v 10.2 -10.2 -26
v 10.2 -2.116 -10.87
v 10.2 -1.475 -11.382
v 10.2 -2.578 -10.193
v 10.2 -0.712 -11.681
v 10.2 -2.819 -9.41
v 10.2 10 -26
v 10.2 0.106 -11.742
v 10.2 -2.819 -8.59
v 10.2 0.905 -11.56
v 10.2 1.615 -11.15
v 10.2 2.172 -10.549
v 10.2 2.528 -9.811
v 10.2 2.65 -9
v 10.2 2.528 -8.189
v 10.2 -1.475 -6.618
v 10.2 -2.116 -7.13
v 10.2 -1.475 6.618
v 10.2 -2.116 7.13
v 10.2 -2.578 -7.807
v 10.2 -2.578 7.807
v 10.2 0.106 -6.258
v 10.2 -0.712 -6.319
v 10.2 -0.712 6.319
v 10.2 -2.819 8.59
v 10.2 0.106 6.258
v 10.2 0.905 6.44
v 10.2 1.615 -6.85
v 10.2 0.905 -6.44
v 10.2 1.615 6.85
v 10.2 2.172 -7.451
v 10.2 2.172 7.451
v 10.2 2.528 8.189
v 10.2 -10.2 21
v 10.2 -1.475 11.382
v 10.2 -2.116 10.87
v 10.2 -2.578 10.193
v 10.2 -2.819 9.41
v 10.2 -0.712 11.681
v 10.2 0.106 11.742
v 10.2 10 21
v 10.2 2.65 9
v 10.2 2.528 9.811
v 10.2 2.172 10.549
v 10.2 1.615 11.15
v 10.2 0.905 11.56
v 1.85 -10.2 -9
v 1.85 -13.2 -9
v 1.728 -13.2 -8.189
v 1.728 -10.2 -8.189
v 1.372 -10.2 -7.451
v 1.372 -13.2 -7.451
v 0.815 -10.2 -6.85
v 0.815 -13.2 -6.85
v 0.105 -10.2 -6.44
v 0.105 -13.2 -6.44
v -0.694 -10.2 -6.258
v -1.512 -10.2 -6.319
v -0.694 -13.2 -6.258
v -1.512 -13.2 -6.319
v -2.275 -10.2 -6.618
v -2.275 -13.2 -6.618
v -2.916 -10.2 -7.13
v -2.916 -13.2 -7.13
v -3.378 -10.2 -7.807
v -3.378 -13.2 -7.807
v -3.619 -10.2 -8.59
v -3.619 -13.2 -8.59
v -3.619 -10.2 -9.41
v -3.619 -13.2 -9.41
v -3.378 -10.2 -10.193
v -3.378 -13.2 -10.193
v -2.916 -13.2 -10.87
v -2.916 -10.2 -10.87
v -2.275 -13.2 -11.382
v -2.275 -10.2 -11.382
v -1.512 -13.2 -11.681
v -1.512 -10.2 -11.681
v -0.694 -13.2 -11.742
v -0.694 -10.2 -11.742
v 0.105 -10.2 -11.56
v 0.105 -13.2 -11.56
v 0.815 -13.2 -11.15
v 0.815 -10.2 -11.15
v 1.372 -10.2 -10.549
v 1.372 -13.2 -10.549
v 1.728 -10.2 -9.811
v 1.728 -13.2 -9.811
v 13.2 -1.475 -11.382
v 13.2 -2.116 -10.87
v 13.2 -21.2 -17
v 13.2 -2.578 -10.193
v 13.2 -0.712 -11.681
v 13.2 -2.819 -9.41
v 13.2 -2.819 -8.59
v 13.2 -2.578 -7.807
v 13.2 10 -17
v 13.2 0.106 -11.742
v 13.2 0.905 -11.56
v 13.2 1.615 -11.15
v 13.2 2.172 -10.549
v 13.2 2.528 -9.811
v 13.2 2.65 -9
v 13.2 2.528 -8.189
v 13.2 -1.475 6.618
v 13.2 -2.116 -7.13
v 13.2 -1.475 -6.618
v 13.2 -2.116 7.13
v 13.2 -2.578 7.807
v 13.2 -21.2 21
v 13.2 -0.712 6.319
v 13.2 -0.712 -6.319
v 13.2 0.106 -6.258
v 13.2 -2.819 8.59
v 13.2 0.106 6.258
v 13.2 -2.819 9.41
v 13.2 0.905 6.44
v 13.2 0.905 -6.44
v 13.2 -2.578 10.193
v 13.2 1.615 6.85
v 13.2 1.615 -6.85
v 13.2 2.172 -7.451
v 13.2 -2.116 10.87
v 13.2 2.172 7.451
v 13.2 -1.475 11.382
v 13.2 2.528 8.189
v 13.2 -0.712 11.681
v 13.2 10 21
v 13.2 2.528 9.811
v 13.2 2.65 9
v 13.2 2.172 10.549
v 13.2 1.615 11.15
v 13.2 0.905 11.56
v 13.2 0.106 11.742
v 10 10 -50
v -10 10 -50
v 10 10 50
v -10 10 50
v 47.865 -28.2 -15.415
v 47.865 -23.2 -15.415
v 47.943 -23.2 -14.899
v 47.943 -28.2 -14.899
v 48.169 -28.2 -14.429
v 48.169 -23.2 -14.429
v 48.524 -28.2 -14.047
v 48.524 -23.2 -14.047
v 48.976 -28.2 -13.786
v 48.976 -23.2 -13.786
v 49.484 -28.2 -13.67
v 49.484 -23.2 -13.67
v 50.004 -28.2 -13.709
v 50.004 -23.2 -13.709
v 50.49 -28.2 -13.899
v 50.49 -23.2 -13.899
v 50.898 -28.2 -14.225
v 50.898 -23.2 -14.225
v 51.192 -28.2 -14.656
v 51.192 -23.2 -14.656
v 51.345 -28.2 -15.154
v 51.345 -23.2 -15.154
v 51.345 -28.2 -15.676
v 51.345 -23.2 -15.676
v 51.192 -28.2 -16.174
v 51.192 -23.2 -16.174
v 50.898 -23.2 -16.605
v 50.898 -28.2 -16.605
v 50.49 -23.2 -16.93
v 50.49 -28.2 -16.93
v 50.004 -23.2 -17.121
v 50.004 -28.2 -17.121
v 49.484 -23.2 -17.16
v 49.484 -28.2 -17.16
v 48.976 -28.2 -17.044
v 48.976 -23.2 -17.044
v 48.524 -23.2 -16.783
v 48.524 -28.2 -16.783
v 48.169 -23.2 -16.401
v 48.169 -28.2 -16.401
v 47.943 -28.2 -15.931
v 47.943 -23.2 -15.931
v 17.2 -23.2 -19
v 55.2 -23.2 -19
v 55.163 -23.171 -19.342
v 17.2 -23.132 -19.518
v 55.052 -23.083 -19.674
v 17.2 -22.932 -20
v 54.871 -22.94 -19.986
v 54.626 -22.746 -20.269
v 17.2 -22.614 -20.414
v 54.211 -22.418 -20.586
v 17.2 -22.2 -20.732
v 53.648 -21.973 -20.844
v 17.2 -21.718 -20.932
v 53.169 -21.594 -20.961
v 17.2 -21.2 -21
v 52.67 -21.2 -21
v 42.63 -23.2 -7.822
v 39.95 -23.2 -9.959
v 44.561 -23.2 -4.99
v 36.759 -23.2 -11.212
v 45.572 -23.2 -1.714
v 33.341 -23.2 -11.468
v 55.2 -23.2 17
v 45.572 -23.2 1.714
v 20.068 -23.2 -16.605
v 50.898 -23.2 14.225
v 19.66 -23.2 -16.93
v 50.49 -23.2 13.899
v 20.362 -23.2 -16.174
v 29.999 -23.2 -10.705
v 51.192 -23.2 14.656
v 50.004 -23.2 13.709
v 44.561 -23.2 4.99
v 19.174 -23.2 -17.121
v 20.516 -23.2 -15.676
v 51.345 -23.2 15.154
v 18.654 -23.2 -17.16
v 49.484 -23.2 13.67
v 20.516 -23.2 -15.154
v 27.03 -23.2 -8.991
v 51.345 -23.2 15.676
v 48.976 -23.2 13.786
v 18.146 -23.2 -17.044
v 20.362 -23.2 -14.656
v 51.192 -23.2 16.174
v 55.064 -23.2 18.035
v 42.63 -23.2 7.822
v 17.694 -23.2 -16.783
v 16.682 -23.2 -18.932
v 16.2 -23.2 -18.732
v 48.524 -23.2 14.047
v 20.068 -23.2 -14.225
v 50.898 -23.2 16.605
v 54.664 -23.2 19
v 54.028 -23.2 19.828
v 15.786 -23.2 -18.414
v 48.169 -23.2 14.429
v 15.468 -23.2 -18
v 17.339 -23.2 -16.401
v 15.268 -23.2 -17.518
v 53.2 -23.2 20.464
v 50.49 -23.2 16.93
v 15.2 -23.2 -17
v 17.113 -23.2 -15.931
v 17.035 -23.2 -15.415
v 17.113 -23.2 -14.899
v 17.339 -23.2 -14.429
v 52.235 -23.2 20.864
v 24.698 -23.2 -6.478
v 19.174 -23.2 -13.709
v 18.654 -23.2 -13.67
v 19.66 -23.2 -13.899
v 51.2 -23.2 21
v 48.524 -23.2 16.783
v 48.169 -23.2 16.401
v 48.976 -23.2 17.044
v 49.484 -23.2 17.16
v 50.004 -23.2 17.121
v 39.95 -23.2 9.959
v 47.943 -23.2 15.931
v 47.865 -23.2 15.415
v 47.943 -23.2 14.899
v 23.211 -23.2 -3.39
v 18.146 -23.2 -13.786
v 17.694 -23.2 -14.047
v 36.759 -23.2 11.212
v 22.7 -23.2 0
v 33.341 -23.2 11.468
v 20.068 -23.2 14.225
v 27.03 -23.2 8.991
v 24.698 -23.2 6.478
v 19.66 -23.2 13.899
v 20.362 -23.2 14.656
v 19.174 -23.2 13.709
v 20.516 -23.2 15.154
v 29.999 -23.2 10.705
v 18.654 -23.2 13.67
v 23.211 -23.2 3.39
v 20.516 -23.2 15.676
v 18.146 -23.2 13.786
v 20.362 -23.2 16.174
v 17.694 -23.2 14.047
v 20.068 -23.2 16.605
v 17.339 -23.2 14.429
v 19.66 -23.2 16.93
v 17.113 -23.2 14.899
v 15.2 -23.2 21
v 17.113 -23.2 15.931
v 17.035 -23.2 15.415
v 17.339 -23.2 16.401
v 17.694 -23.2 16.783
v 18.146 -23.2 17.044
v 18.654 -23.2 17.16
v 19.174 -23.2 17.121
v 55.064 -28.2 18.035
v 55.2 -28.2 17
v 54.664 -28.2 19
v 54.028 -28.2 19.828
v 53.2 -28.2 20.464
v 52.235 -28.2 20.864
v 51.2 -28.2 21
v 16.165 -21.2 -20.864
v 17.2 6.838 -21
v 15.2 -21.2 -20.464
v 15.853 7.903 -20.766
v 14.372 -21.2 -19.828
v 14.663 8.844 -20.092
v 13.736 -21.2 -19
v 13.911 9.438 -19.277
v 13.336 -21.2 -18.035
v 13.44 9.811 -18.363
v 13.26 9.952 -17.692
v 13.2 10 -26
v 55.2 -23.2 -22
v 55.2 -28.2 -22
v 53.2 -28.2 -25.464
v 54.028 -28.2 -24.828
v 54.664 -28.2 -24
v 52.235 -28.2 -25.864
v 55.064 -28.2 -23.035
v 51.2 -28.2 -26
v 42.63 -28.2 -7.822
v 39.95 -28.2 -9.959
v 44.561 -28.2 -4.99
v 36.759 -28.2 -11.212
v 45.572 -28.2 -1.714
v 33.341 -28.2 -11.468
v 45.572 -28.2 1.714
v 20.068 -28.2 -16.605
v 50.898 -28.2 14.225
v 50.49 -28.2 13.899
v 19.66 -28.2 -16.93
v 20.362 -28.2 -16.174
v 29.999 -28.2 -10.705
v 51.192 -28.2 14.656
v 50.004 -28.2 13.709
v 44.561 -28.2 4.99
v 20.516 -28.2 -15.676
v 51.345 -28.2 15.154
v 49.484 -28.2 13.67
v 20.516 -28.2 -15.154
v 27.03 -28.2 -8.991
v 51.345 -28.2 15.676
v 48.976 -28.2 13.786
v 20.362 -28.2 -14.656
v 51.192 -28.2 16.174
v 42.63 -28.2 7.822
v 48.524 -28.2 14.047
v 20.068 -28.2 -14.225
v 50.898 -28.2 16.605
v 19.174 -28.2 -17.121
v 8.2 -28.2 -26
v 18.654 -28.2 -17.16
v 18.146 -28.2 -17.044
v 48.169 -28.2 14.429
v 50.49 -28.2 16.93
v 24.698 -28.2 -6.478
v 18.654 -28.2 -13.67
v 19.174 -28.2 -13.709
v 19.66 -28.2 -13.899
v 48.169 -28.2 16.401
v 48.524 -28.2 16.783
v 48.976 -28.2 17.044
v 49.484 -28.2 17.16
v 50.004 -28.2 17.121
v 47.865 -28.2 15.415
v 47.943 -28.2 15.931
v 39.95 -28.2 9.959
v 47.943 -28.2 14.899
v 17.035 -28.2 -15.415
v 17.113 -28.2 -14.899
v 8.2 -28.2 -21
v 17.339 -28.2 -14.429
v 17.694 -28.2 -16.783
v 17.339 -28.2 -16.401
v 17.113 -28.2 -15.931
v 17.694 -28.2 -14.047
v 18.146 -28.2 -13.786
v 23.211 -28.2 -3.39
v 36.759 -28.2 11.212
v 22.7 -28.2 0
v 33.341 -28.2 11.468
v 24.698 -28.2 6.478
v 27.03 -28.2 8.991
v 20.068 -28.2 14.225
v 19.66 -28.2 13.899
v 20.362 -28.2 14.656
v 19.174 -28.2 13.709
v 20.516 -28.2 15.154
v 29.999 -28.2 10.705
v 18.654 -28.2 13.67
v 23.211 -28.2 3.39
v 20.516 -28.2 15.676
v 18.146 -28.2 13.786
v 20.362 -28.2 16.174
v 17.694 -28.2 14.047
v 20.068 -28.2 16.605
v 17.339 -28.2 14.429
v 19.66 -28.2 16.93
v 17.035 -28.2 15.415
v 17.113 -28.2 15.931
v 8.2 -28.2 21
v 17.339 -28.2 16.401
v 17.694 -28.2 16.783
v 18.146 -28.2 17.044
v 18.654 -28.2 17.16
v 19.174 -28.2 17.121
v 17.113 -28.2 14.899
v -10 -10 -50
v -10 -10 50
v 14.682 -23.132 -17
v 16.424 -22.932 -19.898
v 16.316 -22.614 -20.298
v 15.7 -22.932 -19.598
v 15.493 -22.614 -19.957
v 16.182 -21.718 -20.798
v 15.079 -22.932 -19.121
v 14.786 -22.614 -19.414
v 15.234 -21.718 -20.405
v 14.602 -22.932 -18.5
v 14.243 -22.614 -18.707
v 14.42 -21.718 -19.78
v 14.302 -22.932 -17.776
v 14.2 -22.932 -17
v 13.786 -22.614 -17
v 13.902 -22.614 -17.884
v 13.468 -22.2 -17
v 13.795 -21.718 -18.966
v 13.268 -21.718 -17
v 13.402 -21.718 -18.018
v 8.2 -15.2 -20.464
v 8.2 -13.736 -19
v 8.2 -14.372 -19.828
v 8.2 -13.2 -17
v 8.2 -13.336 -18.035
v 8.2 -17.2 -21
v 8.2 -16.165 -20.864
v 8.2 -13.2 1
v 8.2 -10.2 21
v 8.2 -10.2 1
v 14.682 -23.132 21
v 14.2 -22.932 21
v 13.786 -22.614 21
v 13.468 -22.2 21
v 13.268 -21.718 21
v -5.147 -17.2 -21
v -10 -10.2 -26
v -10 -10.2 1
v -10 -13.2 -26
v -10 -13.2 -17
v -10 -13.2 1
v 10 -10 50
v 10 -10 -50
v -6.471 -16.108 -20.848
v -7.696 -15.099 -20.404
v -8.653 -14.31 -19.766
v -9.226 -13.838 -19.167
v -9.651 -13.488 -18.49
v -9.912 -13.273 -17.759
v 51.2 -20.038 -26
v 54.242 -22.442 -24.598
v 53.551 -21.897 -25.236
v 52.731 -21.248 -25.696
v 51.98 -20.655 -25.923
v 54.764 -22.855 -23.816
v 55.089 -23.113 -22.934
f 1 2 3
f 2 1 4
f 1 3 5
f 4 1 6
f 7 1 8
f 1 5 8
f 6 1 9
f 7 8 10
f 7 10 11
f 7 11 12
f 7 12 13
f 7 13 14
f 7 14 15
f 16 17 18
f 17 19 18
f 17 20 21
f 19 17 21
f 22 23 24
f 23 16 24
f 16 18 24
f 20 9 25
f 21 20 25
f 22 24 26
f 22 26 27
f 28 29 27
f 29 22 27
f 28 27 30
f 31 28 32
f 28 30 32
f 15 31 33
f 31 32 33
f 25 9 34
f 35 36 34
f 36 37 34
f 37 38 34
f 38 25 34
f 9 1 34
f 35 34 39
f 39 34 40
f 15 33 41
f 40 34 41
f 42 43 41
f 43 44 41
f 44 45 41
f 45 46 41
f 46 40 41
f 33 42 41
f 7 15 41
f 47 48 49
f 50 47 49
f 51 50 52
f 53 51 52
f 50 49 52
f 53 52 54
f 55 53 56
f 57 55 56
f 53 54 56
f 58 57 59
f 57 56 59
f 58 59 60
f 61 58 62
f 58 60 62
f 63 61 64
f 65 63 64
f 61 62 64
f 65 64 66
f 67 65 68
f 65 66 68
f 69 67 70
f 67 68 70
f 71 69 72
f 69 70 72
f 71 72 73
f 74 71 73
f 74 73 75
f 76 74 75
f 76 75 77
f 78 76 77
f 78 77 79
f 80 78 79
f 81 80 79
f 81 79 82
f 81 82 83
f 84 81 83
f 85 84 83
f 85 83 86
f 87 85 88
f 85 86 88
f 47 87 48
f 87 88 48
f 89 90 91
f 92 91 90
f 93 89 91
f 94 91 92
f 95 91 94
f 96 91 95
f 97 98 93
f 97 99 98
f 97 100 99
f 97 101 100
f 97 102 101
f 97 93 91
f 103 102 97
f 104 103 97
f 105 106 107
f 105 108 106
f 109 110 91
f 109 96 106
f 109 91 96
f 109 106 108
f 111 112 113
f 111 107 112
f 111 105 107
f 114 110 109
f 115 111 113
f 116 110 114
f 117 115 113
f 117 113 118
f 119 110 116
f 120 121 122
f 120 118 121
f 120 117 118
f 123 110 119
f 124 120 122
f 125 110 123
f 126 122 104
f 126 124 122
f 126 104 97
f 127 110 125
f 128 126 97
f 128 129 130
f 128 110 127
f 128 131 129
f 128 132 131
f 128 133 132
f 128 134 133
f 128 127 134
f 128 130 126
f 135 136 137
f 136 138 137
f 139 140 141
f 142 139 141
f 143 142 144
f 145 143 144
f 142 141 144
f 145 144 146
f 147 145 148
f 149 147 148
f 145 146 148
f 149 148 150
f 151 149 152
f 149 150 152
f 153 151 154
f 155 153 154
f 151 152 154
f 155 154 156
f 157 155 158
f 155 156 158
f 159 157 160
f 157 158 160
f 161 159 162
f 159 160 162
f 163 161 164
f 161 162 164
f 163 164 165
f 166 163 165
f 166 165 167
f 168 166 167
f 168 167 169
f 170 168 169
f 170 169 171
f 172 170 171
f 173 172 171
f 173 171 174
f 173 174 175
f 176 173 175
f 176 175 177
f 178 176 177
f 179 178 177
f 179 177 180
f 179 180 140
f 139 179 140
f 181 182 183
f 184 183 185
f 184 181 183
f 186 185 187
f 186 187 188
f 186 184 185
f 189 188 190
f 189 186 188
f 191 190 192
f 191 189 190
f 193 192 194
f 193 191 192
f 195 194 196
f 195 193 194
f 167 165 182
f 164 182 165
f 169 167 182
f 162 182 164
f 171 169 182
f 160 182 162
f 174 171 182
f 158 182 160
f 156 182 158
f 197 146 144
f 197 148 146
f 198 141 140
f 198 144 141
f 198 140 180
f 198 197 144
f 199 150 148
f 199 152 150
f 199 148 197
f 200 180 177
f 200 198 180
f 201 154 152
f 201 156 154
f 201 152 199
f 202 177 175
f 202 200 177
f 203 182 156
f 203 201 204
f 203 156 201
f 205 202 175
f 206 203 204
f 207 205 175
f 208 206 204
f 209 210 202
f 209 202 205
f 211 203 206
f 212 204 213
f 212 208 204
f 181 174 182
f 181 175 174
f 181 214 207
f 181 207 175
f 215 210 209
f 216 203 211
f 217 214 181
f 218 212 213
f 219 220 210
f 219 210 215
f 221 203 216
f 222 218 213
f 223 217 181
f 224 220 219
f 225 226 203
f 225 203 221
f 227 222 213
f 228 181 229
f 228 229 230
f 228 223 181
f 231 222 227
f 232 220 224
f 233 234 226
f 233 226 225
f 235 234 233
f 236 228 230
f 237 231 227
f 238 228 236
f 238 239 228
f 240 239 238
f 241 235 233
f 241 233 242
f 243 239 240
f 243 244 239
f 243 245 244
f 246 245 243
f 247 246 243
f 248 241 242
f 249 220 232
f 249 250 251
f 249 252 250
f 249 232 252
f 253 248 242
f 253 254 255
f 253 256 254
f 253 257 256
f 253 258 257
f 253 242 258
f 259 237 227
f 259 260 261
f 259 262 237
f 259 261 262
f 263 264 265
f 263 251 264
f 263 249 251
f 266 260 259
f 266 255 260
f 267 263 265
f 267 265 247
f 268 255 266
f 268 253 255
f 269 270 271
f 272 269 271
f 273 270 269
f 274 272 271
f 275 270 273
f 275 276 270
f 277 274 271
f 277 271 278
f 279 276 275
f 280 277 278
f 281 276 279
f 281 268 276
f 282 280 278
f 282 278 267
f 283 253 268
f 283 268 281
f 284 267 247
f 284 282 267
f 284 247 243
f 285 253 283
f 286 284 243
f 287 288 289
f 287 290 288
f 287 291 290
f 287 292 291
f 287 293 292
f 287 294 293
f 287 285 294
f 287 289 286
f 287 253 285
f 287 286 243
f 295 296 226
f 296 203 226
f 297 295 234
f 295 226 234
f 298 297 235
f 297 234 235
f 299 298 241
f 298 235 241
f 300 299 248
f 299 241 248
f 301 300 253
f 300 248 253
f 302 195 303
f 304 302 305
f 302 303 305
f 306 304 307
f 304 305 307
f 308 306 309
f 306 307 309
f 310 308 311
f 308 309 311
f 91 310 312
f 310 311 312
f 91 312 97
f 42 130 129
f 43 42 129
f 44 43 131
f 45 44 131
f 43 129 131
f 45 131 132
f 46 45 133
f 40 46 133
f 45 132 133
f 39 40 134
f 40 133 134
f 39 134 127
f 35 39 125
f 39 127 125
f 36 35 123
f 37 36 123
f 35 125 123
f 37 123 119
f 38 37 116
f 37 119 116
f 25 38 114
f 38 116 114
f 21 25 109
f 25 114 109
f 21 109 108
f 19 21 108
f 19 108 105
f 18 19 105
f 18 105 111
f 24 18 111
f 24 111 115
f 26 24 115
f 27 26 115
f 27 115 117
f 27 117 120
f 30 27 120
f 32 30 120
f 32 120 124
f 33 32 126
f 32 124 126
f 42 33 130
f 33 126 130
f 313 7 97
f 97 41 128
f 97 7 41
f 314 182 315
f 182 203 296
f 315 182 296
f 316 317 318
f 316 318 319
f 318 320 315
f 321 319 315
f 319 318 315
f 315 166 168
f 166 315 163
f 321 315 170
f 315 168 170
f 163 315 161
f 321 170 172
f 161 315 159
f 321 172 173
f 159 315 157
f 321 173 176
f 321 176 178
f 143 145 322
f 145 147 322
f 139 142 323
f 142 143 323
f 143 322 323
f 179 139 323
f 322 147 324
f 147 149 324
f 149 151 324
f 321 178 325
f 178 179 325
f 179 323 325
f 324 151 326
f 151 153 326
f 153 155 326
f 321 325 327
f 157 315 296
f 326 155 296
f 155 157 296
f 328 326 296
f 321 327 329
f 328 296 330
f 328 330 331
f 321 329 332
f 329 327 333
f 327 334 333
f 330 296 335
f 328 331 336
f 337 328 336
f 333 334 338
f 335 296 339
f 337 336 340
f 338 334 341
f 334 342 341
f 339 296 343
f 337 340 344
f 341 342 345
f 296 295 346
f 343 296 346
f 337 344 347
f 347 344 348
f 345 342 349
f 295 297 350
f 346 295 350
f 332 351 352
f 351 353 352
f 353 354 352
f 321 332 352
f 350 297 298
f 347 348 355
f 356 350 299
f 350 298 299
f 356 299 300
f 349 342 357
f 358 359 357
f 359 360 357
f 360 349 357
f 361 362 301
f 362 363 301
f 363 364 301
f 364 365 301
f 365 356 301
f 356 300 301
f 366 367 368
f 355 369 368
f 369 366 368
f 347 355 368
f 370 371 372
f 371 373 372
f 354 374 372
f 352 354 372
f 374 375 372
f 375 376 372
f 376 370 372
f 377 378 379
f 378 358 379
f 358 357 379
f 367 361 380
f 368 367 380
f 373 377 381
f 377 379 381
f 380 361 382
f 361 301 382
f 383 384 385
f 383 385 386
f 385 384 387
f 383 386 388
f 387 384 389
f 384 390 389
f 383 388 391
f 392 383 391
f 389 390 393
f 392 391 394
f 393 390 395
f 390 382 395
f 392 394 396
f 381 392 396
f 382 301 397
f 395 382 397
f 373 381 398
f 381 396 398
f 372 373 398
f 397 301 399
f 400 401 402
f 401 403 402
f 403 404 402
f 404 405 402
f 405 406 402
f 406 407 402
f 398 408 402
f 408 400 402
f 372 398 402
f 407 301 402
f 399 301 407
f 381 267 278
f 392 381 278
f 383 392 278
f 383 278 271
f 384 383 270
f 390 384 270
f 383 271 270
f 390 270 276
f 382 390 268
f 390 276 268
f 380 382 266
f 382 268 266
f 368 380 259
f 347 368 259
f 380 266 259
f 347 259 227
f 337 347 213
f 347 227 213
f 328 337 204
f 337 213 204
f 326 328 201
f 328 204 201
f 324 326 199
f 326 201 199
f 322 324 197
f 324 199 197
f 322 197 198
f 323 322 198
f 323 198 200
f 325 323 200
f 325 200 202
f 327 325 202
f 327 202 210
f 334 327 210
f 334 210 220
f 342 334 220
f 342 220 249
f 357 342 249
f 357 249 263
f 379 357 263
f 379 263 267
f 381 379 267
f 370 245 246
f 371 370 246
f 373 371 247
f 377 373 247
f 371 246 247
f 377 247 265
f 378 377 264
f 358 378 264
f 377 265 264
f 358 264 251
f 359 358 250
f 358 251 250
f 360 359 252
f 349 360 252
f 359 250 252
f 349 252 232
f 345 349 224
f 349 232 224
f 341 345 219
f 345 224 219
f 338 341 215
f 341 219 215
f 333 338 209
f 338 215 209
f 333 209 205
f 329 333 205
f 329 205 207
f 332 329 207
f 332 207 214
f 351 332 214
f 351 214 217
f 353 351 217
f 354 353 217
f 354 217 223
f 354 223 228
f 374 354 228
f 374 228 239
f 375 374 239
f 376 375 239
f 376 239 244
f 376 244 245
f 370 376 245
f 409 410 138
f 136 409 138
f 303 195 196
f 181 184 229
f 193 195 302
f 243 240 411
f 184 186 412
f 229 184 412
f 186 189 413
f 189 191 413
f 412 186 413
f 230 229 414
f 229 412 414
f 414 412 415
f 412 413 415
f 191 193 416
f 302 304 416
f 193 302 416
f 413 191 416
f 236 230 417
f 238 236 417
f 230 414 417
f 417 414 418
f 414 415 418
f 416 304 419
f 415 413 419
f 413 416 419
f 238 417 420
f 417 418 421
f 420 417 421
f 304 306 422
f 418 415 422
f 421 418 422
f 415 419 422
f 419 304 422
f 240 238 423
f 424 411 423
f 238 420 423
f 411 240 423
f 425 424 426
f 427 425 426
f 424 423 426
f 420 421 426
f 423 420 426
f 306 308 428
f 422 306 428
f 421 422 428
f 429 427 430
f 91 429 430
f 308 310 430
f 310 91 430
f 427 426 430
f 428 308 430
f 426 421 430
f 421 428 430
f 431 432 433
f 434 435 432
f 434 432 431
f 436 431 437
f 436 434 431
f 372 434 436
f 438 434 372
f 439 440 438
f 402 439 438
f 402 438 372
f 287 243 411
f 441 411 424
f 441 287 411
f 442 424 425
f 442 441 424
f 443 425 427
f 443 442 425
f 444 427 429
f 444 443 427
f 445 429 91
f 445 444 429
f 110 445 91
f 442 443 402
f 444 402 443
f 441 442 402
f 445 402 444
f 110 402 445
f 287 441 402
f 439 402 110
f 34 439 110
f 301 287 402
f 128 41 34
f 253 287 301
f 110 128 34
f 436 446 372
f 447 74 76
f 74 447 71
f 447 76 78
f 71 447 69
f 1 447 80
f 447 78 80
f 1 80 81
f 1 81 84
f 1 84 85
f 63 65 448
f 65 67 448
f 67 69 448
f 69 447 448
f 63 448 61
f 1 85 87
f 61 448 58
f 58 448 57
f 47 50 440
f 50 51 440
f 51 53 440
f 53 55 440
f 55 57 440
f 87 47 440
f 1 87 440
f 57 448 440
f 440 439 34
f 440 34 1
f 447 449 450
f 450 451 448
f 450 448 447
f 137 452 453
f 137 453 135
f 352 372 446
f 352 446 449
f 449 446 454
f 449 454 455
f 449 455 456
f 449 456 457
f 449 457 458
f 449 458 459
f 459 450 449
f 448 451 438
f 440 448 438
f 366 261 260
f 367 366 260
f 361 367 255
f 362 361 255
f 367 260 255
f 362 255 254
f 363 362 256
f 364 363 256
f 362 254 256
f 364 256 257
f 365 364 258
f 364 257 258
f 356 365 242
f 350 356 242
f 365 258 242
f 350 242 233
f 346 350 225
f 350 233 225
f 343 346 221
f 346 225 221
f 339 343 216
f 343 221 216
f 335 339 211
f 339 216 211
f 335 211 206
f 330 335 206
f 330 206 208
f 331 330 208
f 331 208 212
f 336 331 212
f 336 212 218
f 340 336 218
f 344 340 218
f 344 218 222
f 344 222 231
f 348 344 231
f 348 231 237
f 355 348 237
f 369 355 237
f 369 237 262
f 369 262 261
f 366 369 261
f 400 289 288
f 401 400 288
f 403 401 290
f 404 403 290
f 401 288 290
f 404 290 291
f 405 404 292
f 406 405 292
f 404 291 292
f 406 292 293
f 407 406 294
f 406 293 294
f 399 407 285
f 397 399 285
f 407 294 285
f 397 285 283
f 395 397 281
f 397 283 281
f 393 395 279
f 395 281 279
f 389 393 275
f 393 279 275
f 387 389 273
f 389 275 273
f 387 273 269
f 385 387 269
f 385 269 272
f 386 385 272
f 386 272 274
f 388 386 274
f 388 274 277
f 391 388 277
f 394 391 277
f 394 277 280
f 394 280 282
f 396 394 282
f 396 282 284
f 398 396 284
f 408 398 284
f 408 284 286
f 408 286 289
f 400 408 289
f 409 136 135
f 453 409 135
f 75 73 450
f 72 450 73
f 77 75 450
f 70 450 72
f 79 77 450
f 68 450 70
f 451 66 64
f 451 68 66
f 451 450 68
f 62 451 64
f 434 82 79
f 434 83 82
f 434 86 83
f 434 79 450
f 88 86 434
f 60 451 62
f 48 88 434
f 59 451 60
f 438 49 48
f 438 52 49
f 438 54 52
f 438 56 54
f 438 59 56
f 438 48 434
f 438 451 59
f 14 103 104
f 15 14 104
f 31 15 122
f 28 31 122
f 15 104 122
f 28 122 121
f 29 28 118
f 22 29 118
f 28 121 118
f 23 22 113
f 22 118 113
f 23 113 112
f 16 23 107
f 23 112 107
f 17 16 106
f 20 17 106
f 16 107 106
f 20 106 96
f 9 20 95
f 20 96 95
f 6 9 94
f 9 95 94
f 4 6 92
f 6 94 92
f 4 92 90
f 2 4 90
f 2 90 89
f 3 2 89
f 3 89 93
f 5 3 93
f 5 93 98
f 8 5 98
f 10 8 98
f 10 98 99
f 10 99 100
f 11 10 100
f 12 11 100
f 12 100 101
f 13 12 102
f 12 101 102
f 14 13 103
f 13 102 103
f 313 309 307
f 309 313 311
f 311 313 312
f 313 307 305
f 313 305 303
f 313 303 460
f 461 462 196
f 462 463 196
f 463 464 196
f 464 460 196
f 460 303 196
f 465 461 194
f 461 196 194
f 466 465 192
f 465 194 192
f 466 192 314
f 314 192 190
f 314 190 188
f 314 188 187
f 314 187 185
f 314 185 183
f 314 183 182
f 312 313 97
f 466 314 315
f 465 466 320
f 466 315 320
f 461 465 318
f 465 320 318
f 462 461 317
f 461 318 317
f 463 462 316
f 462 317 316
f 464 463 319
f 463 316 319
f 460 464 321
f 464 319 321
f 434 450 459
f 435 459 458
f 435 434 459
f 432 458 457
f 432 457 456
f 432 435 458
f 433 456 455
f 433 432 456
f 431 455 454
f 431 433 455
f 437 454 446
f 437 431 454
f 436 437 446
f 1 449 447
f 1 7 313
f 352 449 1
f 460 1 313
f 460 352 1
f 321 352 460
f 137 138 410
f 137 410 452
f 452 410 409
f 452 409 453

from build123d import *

# Parameters (mm, degrees)
F0_W      = 20
F0_H      = 20
F1_DEPTH  = 50
F3_DEPTH  = 21
F4_R      = 11.5
F4_R_2    = 1.75
F5_DEPTH  = 5.001
F7_DEPTH  = 5
F8_R      = 2.75
F9_DEPTH  = 3
F10_R     = 2.75
F11_DEPTH = 3
F12_R     = 4
F13_R     = 2
F14_W     = 18.2
F14_H     = 20
F14_R     = 2.75
F15_DEPTH = 25


# Not quite as in the source:
# - a feature names something its author has since deleted; it is built from what else it names


with BuildPart() as f1:
    # F0 (on Top) → F1 (new body, symmetric)
    with BuildSketch(Plane.XY):
        Rectangle(F0_W, F0_H)
    extrude(amount=F1_DEPTH, both=True)


with BuildPart() as f3:
    # F2 (on Top) → F3 (new body, symmetric)
    with BuildSketch(Plane.XY):
        Polygon((10.2, 10), (10.2, -10.2), (-10, -10.2), (-10, -13.2), (8.2, -13.2), (8.2, -28.2), (55.2, -28.2), (55.2, -23.2), (13.2, -23.2), (13.2, 10), align=None)
    extrude(amount=F3_DEPTH, both=True)

    # F4 (on face) → F5 (cut, through all)
    with BuildSketch(Plane(origin=(0, -23.2, 0), x_dir=(-1, 0, 0), z_dir=(0, 1, 0))):
        with Locations((-34.2, 0)):
            Circle(F4_R)
        with Locations((-49.6149278299, 15.4149278299)):
            Circle(F4_R_2)
        with Locations((-18.7850721701, 15.4149278299)):
            Circle(F4_R_2)
        with Locations((-18.7850721701, -15.4149278299)):
            Circle(F4_R_2)
        with Locations((-49.6149278299, -15.4149278299)):
            Circle(F4_R_2)
    extrude(amount=-F5_DEPTH, mode=Mode.SUBTRACT)

    # F6 (on face) → F7 (join)
    with BuildSketch(Plane(origin=(0, 0, -21), x_dir=(1, 0, 0), z_dir=(0, 0, -1))):
        Polygon((13.2, 23.2), (13.2, -10), (55.2, 23.2), align=None)
        Polygon((10.2, -10), (13.2, -10), (13.2, 23.2), (55.2, 23.2), (55.2, 28.2), (8.2, 28.2), (8.2, 13.2), (-10, 13.2), (-10, 10.2), (10.2, 10.2), align=None)
        Polygon((8.2, 13.2), (8.2, 28.2), (-10, 13.2), align=None)
    extrude(amount=F7_DEPTH)

    # F8 (on face) → F9 (cut, through all)
    with BuildSketch(Plane.XZ.offset(13.2)):
        with Locations((-0.9, 9)):
            Circle(F8_R)
        with Locations((-0.9, -9)):
            Circle(F8_R)
    extrude(amount=-F9_DEPTH, mode=Mode.SUBTRACT)

    # F10 (on face) → F11 (cut, through all)
    with BuildSketch(Plane.YZ.offset(13.2)):
        with Locations((-0.1, 9)):
            Circle(F10_R)
        with Locations((-0.1, -9)):
            Circle(F10_R)
    extrude(amount=-F11_DEPTH, mode=Mode.SUBTRACT)

    # F12
    f12_edges = [f3.edges().sort_by_distance(p)[0] for p in [
        (13.2, -6.6, -21),
        (-0.9, -13.2, -21),
        (55.2, -25.7, 21),
        (55.2, -25.7, -26),
    ]]
    fillet(f12_edges, radius=F12_R)

    # F13
    f13_edges = [f3.edges().sort_by_distance(p)[0] for p in [
        (36.2, -23.2, -21),
        (13.2, -23.2, 2),
        (14.371573, -23.2, -19.828427),
    ]]
    fillet(f13_edges, radius=F13_R)

    # F14 (on face) → F15 (cut)
    with BuildSketch(Plane.XZ.offset(13.2)):
        with Locations((-0.9, 11)):
            Rectangle(F14_W, F14_H)
        with Locations((-0.9, 9)):
            Circle(F14_R, mode=Mode.SUBTRACT)
    extrude(amount=-F15_DEPTH, mode=Mode.SUBTRACT)


solid = Compound([f1.part, f3.part])
